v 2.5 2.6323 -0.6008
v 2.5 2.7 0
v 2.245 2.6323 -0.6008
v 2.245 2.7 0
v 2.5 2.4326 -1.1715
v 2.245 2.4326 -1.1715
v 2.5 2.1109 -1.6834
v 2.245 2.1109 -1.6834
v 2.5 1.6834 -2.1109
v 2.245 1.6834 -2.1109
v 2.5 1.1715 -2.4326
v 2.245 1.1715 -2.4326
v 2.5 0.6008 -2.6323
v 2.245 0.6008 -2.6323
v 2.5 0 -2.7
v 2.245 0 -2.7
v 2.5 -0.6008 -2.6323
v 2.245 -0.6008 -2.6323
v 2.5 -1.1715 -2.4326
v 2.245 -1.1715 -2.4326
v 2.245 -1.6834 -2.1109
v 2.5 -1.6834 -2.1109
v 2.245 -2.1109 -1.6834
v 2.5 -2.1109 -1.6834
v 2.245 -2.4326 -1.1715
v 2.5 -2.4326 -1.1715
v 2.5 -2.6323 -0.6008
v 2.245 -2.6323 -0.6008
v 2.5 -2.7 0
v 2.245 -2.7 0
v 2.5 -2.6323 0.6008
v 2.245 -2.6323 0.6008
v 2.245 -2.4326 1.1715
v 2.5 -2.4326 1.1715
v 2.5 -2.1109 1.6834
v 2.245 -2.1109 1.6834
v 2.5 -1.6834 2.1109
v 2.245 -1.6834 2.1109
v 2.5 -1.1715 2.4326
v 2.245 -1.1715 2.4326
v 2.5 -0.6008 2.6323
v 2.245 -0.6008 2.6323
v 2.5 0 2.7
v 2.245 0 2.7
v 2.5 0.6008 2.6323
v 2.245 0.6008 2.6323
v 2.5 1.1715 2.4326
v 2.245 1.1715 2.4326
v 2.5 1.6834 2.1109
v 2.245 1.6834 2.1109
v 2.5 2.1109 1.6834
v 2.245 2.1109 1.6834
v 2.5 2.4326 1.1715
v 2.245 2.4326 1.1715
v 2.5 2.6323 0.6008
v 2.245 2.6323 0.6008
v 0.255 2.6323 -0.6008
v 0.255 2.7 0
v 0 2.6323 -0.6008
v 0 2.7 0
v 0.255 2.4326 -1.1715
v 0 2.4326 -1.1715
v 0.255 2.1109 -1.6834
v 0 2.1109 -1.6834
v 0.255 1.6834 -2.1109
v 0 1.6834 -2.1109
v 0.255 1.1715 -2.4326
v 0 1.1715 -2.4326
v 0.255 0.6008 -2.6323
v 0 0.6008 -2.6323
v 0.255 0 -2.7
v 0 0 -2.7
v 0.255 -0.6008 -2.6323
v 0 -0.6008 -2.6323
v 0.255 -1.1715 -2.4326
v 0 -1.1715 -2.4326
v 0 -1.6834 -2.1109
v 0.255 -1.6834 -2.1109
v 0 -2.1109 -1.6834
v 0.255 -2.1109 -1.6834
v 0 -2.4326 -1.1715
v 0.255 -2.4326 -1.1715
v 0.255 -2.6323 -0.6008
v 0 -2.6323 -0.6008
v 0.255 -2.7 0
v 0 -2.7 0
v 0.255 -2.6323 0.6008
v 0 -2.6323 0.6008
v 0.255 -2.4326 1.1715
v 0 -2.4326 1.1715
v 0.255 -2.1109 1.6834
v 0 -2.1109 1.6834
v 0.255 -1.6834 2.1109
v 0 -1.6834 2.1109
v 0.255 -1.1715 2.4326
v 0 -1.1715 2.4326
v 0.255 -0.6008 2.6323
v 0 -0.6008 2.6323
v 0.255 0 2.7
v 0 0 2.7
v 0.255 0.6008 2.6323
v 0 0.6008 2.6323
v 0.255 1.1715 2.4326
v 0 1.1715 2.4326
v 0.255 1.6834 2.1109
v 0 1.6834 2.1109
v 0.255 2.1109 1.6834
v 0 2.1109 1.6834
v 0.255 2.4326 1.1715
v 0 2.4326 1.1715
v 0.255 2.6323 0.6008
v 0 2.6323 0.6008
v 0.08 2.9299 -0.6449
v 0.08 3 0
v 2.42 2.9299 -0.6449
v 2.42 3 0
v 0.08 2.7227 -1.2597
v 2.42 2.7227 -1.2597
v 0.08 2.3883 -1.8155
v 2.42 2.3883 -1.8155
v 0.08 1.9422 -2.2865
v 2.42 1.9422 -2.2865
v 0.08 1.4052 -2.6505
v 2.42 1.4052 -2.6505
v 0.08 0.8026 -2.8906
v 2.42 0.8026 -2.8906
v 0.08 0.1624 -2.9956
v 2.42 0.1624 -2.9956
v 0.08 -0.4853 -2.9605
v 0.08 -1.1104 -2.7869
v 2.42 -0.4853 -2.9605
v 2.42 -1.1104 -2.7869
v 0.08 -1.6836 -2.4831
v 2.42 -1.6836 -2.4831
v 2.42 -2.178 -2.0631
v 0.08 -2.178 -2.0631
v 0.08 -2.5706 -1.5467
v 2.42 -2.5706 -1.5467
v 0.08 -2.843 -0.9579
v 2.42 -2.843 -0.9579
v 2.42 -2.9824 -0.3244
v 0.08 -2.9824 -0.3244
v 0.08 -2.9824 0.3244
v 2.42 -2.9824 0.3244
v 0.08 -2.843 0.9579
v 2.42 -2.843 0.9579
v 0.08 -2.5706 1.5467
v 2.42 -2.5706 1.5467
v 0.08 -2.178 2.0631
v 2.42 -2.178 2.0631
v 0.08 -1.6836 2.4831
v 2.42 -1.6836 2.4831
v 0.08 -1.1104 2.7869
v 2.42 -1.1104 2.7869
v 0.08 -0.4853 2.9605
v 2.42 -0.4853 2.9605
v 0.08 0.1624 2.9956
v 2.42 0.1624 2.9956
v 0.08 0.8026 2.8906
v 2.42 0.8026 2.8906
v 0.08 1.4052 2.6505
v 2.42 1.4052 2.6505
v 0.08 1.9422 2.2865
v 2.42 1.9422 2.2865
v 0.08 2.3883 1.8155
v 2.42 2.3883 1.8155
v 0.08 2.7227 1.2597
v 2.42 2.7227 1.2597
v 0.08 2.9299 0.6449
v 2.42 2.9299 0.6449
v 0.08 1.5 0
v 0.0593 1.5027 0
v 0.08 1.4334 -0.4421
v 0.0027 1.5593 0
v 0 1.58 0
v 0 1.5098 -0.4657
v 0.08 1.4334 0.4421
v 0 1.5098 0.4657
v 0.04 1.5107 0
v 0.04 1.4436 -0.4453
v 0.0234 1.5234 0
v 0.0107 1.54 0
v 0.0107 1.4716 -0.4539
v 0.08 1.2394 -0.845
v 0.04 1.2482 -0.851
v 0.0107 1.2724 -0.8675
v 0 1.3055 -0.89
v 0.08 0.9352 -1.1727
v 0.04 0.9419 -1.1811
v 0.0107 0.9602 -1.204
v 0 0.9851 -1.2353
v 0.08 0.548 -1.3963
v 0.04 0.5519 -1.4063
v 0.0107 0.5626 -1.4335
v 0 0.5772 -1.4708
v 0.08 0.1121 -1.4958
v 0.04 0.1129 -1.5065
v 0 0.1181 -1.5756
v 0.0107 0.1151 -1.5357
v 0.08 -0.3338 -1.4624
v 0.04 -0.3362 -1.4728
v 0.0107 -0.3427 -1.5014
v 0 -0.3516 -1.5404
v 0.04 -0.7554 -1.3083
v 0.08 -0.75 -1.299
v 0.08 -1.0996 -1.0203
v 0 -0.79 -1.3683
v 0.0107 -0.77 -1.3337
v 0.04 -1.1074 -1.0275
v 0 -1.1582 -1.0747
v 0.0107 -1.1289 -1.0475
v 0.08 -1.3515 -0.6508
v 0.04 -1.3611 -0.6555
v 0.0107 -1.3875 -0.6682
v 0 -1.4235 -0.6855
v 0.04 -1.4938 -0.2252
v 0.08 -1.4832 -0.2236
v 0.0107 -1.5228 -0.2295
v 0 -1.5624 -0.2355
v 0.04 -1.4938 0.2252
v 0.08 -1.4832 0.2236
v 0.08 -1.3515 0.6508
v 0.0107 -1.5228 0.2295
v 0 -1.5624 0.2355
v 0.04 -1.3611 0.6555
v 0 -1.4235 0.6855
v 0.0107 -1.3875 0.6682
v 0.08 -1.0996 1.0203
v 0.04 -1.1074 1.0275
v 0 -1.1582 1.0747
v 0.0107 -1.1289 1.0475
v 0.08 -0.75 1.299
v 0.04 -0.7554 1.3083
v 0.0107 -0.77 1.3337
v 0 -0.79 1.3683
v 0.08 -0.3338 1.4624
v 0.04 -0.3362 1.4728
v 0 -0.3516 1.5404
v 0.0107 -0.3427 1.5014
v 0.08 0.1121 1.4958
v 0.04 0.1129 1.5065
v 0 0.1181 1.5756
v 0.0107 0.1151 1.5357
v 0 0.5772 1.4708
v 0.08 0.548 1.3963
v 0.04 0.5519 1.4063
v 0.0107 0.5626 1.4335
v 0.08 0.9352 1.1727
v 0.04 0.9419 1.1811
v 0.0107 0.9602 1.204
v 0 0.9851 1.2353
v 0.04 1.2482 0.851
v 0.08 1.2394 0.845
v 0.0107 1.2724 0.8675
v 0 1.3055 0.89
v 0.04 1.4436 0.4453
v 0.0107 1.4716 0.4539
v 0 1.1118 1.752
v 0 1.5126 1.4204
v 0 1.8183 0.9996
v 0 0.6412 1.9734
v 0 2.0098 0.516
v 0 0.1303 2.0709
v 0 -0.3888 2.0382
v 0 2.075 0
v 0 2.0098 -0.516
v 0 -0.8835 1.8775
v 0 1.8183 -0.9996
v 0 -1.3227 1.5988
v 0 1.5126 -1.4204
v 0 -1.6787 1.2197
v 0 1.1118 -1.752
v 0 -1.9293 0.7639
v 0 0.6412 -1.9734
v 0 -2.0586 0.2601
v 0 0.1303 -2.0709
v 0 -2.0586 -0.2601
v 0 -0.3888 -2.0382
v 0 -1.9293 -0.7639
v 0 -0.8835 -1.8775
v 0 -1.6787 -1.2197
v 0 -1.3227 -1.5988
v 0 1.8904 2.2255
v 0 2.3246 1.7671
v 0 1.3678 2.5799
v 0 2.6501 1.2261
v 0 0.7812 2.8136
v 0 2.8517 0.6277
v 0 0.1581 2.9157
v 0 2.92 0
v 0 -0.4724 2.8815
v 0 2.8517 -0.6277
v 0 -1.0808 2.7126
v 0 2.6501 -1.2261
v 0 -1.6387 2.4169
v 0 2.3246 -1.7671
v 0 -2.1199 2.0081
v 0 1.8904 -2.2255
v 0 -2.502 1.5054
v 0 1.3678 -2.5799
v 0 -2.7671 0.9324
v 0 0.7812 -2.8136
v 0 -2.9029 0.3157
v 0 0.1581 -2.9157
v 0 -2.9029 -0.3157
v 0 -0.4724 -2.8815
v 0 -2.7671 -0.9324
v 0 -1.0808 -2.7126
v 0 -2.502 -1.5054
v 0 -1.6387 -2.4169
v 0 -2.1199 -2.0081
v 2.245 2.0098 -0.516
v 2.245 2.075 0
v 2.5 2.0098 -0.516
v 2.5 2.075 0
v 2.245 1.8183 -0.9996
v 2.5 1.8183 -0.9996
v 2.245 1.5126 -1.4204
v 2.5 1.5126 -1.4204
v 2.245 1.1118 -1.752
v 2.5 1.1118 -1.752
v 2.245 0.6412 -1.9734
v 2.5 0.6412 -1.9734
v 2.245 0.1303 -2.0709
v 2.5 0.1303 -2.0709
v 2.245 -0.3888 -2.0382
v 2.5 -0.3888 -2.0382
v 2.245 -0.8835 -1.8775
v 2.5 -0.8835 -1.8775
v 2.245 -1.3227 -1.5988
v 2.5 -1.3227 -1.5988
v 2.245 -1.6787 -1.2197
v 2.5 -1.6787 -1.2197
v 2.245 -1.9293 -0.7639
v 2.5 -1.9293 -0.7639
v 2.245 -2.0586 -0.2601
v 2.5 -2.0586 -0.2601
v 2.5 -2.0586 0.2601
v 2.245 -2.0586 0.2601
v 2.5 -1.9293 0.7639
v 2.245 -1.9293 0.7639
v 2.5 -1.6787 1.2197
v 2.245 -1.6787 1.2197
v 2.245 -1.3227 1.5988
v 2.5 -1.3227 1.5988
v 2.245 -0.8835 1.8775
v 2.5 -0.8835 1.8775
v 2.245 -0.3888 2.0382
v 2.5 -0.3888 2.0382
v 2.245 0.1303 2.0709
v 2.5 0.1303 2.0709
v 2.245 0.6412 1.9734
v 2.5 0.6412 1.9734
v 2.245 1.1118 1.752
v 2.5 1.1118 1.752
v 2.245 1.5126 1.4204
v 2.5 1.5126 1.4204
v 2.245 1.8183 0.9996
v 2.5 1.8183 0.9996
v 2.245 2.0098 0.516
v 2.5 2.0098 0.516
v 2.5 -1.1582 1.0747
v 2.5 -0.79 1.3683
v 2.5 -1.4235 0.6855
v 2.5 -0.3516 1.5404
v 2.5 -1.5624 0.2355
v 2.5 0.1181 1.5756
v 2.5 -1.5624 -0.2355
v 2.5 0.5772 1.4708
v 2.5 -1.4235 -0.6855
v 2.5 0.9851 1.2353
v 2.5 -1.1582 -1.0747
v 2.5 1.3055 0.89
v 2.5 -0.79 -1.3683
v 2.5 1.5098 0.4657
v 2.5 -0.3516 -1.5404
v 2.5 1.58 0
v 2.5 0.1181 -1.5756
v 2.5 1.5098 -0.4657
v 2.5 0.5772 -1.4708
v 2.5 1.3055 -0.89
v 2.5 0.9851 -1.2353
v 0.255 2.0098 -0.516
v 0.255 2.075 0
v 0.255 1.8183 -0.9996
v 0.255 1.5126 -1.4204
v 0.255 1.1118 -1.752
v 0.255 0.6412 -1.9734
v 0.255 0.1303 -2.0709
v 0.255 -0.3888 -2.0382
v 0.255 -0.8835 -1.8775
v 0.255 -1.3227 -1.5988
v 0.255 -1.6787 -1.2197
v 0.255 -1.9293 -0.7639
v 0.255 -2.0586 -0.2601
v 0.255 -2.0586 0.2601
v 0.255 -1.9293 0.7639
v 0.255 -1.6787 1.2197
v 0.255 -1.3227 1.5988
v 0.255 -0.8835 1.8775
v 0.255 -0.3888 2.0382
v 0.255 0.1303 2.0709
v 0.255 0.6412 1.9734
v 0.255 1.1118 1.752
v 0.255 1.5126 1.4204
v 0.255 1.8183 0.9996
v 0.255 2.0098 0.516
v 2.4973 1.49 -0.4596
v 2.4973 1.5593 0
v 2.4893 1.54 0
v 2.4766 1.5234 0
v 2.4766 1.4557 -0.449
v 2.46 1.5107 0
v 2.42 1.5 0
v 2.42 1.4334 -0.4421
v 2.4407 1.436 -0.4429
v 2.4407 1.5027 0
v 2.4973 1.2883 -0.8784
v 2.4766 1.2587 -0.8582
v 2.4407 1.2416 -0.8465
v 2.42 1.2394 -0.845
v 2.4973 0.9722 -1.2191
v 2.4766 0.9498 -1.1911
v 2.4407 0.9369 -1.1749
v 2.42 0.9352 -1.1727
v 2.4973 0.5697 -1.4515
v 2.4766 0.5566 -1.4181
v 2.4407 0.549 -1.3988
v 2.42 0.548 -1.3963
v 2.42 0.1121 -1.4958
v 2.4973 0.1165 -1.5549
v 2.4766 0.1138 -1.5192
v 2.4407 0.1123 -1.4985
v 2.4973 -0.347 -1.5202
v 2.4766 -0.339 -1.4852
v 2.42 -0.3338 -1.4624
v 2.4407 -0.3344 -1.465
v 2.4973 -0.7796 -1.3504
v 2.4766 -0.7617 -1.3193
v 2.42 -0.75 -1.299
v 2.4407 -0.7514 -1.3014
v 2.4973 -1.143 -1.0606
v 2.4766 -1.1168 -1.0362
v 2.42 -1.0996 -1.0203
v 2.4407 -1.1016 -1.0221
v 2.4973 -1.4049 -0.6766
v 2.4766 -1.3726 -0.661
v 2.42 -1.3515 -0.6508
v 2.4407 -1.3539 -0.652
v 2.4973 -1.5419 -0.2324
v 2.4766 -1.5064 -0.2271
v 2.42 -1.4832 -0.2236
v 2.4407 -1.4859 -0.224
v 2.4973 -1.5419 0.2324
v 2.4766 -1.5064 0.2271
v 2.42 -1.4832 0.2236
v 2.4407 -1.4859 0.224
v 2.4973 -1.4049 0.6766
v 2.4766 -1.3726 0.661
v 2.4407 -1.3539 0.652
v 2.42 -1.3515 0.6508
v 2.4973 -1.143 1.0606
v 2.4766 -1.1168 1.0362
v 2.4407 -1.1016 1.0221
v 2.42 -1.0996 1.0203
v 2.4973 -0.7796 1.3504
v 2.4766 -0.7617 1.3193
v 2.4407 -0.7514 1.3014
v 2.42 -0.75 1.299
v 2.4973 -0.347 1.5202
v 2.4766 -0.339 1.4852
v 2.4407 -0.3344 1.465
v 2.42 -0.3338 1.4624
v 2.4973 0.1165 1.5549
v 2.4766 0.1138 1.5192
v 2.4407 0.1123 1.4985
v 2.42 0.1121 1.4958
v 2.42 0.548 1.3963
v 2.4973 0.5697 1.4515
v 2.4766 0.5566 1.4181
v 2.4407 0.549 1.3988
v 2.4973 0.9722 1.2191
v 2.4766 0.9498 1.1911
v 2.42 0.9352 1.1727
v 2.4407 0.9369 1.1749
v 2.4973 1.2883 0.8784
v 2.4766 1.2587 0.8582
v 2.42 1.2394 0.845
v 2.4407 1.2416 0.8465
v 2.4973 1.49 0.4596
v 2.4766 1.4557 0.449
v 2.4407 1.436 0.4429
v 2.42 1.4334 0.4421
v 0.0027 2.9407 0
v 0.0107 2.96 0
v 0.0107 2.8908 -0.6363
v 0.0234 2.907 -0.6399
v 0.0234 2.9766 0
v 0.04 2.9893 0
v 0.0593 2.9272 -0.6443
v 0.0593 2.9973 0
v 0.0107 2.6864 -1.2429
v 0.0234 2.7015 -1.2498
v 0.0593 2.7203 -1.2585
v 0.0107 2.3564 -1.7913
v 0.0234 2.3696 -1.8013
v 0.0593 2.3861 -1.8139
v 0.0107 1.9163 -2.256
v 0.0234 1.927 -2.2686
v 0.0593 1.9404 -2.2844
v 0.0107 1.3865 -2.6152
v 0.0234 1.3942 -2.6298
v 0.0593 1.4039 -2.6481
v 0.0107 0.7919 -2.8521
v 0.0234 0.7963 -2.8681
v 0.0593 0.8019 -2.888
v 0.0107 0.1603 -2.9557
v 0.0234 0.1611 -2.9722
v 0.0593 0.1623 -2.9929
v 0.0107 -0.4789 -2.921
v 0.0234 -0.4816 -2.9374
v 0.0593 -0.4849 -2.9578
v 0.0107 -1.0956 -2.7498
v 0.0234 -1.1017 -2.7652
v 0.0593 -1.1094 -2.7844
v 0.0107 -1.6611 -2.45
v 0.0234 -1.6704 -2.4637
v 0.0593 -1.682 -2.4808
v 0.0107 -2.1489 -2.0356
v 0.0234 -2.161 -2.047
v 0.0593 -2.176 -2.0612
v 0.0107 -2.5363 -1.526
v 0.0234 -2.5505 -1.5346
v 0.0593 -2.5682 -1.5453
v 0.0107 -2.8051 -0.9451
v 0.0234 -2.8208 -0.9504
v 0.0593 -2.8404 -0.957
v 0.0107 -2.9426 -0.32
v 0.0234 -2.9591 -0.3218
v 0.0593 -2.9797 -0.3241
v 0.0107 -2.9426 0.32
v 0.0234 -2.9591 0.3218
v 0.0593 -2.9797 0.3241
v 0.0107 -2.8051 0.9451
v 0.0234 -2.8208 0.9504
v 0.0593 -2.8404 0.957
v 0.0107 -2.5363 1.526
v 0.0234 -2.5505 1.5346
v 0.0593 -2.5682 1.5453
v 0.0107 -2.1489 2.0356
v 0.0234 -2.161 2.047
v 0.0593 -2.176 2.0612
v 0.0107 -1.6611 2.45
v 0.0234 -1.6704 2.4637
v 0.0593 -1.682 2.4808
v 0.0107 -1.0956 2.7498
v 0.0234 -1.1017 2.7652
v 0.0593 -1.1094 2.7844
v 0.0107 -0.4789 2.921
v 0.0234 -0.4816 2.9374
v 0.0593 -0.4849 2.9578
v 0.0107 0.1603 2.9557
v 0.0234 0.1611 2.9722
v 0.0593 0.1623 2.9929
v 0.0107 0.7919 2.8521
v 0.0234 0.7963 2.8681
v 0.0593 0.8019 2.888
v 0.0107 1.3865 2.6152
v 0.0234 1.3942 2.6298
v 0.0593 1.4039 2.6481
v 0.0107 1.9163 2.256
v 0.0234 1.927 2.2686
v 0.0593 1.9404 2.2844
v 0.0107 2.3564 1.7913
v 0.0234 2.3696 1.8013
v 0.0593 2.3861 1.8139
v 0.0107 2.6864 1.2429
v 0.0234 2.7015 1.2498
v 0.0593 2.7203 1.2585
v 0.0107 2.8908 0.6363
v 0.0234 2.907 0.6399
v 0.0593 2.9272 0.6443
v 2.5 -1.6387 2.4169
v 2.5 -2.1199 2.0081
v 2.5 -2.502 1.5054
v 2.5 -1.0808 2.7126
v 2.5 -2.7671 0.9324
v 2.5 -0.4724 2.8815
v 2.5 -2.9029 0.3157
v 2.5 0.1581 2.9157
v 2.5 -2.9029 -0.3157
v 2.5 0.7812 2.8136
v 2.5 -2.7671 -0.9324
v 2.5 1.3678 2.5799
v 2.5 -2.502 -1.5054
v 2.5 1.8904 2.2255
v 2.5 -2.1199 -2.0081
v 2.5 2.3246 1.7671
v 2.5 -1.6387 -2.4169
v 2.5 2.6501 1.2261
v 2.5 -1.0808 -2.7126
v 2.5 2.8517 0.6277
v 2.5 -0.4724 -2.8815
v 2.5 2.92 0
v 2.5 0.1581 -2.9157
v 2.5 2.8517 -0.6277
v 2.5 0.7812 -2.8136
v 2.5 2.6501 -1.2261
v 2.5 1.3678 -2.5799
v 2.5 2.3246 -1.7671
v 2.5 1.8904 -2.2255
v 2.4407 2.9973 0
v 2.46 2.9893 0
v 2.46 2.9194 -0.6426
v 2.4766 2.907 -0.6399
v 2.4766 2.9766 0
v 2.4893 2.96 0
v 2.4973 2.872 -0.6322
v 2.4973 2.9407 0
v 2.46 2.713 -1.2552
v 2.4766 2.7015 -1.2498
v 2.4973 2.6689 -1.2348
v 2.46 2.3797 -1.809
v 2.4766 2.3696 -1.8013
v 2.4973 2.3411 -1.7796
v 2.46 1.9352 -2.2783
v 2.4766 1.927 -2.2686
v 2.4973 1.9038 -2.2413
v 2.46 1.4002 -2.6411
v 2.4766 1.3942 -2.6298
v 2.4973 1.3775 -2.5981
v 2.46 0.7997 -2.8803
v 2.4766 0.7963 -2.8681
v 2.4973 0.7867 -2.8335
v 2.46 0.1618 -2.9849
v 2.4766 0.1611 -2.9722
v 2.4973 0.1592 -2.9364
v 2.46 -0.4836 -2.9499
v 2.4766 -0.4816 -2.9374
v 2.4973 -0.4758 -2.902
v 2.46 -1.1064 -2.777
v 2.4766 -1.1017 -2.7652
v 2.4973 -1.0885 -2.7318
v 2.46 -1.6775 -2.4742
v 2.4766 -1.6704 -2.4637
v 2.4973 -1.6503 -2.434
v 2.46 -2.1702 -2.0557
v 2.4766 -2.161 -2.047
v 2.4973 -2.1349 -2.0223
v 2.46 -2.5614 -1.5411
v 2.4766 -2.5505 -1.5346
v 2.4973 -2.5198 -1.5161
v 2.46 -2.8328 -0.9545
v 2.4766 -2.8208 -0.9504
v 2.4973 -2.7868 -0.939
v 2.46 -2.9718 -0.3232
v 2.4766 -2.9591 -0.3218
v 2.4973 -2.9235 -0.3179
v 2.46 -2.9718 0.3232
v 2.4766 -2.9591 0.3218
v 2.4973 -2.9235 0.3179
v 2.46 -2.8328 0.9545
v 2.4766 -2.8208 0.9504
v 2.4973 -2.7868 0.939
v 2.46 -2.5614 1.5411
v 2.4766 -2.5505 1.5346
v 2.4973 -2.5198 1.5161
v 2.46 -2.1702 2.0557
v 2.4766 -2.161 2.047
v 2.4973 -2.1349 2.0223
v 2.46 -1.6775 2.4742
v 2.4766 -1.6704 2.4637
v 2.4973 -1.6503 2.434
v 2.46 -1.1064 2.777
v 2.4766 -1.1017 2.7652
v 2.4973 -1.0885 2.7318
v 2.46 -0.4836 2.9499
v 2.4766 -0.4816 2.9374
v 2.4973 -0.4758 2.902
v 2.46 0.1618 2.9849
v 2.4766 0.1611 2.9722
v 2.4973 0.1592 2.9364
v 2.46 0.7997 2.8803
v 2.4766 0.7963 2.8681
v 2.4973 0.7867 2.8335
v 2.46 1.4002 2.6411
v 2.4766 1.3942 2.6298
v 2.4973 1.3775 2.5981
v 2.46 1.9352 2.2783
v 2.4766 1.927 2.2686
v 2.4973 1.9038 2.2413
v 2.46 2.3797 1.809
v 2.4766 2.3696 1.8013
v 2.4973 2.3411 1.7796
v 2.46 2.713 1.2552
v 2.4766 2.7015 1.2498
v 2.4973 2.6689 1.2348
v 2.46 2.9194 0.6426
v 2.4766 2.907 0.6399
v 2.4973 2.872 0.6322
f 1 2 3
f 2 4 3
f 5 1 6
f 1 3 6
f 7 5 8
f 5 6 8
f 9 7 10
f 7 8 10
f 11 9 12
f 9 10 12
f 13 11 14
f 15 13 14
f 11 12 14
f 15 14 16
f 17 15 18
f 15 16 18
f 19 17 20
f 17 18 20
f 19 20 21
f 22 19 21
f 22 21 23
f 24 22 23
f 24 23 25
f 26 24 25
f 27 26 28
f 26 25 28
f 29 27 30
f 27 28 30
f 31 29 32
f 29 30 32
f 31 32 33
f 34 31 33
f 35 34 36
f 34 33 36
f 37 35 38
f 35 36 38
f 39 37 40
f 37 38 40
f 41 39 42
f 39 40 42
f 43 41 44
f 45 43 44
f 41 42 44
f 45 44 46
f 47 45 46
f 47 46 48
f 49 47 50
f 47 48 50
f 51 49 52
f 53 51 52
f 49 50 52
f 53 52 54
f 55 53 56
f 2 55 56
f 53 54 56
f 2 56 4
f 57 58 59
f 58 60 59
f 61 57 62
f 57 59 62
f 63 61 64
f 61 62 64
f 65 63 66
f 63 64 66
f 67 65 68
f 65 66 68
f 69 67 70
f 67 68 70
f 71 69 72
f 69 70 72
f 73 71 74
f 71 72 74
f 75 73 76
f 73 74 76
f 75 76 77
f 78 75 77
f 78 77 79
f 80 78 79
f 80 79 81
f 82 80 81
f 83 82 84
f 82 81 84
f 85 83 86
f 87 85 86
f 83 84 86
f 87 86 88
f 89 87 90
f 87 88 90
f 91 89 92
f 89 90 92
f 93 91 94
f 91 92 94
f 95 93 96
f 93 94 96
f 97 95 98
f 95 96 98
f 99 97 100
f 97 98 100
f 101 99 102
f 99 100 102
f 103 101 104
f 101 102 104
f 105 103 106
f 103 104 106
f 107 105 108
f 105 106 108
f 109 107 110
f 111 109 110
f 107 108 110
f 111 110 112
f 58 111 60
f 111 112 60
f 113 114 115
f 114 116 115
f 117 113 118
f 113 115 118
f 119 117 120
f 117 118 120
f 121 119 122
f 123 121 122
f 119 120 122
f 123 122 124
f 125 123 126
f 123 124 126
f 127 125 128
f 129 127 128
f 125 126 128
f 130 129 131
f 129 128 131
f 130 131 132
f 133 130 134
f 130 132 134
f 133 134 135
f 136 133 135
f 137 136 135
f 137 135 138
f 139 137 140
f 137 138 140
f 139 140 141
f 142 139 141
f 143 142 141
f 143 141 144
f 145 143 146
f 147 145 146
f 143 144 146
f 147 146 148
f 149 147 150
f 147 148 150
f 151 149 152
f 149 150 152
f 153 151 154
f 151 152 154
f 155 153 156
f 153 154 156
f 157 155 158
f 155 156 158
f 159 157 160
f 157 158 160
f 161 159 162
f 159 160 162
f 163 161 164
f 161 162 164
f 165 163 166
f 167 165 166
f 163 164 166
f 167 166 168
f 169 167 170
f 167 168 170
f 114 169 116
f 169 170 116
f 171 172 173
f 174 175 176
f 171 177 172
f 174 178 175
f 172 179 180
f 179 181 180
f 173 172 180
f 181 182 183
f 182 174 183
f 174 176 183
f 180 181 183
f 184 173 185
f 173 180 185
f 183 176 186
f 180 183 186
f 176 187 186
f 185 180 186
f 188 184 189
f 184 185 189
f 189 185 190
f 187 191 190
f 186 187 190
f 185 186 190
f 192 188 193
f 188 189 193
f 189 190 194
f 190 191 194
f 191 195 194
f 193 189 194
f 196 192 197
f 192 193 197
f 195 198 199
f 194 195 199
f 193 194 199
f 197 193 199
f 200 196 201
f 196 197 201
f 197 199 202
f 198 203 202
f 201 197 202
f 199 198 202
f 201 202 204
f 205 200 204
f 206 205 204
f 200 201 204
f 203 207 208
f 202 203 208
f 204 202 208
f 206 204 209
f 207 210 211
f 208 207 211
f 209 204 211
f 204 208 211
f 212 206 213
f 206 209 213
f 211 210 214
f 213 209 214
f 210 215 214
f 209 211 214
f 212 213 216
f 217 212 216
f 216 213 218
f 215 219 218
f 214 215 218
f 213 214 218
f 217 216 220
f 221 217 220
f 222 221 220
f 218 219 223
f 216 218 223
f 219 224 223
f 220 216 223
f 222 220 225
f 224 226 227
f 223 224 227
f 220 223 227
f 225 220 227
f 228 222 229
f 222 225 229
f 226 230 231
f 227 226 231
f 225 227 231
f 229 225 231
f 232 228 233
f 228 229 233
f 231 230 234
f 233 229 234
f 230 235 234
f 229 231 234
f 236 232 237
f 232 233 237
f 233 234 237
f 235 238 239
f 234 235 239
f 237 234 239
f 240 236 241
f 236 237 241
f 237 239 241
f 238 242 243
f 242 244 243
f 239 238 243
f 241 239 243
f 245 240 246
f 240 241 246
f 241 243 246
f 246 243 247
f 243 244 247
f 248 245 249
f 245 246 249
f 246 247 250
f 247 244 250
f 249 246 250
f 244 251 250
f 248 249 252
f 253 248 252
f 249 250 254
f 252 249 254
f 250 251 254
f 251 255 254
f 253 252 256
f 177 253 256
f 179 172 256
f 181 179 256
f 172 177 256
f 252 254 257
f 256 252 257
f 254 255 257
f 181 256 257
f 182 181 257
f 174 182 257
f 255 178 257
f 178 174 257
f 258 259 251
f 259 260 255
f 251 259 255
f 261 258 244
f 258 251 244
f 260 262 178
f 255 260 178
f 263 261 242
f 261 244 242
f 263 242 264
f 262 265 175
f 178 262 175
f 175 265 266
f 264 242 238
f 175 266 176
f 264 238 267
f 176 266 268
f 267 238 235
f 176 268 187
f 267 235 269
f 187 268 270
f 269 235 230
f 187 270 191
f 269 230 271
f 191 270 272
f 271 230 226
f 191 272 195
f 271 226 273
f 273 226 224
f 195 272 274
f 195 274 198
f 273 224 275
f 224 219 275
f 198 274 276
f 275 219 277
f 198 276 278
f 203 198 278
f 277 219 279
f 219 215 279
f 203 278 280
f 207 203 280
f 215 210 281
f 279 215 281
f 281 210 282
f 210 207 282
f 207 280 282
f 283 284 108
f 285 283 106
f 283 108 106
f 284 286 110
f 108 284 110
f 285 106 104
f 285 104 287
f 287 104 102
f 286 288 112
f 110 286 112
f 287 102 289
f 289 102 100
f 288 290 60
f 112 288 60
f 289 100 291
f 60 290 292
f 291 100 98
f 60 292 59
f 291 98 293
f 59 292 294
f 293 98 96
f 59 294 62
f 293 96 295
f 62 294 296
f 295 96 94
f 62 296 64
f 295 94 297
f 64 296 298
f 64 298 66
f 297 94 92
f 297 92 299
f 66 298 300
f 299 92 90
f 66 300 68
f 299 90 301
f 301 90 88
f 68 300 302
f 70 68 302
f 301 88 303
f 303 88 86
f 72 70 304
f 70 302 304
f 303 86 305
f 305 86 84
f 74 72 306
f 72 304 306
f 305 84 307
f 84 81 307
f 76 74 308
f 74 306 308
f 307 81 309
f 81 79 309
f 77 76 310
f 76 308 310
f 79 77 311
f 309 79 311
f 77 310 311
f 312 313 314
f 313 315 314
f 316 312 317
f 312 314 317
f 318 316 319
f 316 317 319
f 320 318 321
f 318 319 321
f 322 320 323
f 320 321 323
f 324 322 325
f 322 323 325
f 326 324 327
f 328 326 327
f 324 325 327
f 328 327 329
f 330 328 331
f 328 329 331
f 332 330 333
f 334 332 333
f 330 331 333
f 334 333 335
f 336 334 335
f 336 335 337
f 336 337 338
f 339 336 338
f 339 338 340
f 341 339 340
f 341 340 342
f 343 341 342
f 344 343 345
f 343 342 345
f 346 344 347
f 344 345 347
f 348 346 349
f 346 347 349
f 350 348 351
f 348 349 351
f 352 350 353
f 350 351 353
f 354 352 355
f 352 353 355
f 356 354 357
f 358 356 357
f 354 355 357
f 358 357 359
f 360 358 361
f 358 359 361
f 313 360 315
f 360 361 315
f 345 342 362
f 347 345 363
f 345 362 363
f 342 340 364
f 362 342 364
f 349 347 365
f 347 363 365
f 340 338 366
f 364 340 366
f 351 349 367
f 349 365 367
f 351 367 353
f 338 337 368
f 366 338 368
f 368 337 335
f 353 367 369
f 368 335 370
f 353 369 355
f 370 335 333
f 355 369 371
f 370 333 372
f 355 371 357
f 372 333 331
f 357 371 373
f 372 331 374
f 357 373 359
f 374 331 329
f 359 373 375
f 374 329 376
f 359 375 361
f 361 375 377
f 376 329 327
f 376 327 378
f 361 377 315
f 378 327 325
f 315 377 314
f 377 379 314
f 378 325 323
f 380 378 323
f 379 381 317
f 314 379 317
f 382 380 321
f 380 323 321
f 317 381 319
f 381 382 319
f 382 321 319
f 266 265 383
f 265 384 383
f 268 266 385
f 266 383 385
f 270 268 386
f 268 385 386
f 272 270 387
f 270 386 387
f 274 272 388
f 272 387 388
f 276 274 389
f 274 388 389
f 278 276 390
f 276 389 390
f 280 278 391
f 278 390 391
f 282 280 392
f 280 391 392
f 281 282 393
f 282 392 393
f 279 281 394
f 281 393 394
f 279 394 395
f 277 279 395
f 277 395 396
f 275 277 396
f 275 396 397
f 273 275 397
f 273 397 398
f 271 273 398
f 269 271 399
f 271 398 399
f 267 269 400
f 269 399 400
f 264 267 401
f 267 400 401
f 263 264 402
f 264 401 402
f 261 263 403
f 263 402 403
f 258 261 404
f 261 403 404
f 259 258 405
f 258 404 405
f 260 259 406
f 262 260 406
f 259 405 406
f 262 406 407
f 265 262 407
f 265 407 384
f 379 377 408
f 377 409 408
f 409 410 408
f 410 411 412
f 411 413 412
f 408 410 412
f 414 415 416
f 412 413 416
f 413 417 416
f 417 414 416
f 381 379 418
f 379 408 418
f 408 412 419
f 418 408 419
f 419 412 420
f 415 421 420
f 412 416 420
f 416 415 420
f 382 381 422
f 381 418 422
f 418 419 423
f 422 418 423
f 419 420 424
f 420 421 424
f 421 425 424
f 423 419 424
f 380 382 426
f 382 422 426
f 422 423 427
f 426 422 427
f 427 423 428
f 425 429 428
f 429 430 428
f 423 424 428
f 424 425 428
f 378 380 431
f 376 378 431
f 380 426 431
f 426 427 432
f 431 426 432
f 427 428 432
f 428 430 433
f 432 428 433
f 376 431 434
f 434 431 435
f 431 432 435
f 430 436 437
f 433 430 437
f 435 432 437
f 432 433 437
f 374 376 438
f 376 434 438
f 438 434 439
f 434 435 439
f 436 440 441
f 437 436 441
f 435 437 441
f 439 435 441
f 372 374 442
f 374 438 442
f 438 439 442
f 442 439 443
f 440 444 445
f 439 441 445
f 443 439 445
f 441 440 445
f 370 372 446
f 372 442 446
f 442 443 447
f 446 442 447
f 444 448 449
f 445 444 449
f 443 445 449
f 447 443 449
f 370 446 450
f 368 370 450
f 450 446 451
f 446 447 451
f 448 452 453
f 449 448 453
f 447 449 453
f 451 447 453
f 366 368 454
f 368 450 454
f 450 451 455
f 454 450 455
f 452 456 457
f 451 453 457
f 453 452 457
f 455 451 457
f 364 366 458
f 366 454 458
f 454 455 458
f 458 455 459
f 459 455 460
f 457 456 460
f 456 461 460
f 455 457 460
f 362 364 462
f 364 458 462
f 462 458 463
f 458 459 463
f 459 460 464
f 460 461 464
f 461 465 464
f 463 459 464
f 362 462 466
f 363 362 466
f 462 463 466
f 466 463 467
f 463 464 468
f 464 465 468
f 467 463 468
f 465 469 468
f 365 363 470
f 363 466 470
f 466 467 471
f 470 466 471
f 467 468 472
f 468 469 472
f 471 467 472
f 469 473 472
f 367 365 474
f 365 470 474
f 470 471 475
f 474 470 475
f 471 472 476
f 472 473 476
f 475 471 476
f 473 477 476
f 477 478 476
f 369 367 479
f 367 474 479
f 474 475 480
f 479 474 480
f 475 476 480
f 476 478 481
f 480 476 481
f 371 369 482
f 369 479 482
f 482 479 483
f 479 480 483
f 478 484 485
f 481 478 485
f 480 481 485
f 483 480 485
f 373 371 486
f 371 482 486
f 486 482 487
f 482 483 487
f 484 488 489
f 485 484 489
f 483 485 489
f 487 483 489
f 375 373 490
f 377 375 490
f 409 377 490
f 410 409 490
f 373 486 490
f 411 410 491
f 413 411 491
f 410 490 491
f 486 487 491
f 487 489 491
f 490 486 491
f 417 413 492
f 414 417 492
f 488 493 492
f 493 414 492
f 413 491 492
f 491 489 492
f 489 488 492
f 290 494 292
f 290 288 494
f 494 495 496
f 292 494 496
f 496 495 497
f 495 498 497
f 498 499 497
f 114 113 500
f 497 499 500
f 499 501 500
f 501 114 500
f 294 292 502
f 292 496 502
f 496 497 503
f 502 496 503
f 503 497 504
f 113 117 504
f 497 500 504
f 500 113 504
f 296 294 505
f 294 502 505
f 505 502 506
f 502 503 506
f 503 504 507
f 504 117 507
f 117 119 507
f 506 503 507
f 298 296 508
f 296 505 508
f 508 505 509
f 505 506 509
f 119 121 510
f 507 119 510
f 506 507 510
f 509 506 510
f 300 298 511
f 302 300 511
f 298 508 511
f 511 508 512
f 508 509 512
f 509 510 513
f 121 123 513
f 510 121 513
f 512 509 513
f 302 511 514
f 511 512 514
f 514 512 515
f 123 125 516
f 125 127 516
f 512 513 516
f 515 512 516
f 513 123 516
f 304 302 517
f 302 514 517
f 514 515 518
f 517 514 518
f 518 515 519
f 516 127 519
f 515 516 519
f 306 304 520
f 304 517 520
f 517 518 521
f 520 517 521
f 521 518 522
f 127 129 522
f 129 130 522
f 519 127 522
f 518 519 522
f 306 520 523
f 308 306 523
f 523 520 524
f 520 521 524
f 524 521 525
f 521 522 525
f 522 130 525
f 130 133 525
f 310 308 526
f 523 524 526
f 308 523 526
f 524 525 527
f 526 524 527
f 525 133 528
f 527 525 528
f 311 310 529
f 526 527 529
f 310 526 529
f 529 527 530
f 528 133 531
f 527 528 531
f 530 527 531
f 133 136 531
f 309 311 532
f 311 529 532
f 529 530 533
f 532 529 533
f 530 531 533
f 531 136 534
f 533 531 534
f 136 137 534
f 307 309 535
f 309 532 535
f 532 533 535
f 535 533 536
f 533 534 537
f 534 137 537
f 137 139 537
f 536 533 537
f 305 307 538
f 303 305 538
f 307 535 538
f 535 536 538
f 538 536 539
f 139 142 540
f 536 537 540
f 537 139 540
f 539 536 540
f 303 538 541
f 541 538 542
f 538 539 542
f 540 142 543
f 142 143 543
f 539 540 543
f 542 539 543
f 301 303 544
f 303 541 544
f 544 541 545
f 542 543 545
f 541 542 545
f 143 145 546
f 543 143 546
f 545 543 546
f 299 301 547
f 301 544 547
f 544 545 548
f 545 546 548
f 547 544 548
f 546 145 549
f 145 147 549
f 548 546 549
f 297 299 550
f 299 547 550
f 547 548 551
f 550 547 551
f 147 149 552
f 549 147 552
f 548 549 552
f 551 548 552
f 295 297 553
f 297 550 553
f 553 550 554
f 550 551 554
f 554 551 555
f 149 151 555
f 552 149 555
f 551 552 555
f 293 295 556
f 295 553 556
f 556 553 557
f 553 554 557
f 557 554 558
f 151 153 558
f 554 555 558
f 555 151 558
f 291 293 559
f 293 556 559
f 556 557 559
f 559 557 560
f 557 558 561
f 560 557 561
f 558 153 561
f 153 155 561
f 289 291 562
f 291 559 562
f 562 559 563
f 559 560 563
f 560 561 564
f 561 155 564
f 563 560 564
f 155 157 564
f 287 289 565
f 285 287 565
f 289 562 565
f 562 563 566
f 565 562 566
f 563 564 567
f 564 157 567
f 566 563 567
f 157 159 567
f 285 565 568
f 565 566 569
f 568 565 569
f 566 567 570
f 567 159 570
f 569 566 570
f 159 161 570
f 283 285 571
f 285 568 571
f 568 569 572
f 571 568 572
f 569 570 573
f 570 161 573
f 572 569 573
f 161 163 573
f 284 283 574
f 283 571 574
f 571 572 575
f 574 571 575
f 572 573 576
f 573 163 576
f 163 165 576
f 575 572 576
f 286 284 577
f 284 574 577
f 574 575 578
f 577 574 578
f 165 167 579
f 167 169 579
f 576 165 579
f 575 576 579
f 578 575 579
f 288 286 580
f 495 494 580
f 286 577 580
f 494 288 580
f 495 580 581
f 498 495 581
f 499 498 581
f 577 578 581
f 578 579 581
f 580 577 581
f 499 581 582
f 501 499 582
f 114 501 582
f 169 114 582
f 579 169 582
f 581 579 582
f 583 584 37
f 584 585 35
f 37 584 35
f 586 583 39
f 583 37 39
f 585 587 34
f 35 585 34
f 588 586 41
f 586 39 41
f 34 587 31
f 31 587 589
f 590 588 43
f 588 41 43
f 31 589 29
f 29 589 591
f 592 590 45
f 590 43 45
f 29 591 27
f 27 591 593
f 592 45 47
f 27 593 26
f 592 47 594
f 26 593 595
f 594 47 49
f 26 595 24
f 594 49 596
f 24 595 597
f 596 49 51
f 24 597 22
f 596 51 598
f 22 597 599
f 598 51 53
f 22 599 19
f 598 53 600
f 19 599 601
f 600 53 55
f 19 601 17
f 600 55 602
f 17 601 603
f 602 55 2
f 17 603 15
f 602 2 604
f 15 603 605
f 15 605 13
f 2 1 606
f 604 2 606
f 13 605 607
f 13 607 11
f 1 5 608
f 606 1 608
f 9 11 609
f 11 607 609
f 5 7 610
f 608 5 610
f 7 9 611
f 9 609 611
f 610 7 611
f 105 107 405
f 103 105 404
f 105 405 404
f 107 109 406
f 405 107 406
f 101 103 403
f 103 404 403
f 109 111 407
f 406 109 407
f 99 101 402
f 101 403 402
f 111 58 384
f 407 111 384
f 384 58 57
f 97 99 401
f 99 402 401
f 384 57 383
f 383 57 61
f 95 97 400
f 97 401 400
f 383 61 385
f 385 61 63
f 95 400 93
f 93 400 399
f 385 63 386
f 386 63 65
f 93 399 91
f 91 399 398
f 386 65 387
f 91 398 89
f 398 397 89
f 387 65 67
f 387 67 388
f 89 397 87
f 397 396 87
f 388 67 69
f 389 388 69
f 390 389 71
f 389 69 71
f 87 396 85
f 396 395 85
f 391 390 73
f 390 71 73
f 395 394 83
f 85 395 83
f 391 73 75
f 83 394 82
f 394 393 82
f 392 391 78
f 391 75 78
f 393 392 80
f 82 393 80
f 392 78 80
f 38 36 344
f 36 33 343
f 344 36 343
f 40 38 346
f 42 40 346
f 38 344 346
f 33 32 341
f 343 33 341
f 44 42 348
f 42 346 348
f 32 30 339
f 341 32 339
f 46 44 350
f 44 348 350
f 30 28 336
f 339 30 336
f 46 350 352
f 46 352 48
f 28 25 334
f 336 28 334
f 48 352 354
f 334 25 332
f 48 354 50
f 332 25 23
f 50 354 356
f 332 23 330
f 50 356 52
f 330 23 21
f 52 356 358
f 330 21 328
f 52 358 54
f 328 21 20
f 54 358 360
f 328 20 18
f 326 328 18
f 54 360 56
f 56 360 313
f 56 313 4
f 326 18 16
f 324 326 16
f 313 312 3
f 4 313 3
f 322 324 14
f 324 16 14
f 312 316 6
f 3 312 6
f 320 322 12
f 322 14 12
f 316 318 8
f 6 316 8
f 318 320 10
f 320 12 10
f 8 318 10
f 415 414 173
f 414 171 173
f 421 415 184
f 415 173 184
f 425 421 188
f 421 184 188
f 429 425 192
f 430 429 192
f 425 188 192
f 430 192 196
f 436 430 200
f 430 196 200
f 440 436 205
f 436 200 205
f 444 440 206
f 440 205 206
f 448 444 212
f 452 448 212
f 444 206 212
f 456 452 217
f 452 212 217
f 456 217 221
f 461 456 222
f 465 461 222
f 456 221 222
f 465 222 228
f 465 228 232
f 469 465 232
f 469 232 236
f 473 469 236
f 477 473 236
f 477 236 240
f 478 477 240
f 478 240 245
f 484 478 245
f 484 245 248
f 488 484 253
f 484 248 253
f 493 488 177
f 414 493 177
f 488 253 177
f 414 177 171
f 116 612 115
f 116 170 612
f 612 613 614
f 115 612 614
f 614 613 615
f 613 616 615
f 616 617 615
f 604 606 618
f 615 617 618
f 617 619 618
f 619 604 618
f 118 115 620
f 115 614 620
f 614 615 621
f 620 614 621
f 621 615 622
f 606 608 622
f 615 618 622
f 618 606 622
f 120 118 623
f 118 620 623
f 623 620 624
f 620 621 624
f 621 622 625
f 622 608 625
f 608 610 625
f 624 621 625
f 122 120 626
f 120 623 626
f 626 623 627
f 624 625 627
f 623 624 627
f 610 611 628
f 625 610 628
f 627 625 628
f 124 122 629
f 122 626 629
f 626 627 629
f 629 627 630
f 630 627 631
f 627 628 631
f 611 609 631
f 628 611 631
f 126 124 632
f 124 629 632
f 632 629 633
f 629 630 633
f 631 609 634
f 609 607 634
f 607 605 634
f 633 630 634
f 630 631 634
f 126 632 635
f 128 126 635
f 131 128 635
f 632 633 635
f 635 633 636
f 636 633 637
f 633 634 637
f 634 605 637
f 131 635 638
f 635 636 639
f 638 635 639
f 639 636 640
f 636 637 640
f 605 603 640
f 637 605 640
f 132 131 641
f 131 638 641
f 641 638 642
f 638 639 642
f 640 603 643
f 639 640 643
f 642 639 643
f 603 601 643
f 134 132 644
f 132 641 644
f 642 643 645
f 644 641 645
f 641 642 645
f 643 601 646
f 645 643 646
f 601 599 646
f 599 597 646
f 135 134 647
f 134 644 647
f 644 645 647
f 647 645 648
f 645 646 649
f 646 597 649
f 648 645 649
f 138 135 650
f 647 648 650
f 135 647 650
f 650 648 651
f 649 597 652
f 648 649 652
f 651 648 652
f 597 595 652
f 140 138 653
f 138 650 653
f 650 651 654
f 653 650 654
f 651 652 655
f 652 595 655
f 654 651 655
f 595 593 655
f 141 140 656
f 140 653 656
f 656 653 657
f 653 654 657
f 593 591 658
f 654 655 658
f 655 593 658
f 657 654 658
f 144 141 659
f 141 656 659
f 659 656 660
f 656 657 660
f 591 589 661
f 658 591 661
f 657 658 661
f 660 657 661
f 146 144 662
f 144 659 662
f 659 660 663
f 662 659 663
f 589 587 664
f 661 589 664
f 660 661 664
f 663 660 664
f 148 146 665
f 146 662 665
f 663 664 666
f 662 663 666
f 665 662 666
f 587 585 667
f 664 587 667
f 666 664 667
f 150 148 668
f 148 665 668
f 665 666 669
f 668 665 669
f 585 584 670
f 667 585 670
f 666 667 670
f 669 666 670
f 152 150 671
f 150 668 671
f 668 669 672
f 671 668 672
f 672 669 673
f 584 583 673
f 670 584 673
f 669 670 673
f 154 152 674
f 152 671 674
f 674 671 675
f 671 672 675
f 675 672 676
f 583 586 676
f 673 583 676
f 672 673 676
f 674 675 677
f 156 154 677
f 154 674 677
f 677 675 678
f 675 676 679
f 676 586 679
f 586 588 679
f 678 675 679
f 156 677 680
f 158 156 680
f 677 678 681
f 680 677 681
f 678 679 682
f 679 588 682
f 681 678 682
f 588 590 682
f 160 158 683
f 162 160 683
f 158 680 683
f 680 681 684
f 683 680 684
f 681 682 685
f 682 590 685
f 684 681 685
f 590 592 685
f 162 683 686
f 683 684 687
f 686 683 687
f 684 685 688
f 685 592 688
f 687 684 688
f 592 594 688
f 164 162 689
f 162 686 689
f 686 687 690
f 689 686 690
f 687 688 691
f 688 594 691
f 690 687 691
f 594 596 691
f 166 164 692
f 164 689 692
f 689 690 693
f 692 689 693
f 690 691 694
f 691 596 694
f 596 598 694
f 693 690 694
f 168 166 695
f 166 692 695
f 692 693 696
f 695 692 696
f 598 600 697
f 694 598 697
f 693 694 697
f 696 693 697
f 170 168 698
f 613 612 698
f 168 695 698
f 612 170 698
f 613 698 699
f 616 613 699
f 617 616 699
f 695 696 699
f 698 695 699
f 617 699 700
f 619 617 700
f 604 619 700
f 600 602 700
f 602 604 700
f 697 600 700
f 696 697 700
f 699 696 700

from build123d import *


with BuildPart() as part:
    # 草图1 → 旋转1 (revolve)
    with BuildSketch(Plane(origin=(0, 0, 0), x_dir=(-1, 0, 0), z_dir=(0, 0, -1))):
        with BuildLine():
            Line((0, 2.075), (-0.255, 2.075))
            Line((-0.255, 2.075), (-0.255, 2.7))
            Line((-0.255, 2.7), (0, 2.7))
            Line((0, 2.7), (0, 2.92))
            ThreePointArc((0, 2.92), (-0.023431458, 2.976568542), (-0.08, 3))
            Line((-0.08, 3), (-2.42, 3))
            ThreePointArc((-2.42, 3), (-2.476568542, 2.976568542), (-2.5, 2.92))
            Line((-2.5, 2.92), (-2.5, 2.7))
            Line((-2.5, 2.7), (-2.245, 2.7))
            Line((-2.245, 2.7), (-2.245, 2.075))
            Line((-2.245, 2.075), (-2.5, 2.075))
            Line((-2.5, 2.075), (-2.5, 1.58))
            ThreePointArc((-2.5, 1.58), (-2.476568542, 1.523431458), (-2.42, 1.5))
            Line((-2.42, 1.5), (-0.08, 1.5))
            ThreePointArc((-0.08, 1.5), (-0.023431458, 1.523431458), (0, 1.58))
            Line((0, 1.58), (0, 2.075))
        make_face()
    revolve(axis=Axis((2.5, 0, 0), (-1, 0, 0)))


solid = part.part
